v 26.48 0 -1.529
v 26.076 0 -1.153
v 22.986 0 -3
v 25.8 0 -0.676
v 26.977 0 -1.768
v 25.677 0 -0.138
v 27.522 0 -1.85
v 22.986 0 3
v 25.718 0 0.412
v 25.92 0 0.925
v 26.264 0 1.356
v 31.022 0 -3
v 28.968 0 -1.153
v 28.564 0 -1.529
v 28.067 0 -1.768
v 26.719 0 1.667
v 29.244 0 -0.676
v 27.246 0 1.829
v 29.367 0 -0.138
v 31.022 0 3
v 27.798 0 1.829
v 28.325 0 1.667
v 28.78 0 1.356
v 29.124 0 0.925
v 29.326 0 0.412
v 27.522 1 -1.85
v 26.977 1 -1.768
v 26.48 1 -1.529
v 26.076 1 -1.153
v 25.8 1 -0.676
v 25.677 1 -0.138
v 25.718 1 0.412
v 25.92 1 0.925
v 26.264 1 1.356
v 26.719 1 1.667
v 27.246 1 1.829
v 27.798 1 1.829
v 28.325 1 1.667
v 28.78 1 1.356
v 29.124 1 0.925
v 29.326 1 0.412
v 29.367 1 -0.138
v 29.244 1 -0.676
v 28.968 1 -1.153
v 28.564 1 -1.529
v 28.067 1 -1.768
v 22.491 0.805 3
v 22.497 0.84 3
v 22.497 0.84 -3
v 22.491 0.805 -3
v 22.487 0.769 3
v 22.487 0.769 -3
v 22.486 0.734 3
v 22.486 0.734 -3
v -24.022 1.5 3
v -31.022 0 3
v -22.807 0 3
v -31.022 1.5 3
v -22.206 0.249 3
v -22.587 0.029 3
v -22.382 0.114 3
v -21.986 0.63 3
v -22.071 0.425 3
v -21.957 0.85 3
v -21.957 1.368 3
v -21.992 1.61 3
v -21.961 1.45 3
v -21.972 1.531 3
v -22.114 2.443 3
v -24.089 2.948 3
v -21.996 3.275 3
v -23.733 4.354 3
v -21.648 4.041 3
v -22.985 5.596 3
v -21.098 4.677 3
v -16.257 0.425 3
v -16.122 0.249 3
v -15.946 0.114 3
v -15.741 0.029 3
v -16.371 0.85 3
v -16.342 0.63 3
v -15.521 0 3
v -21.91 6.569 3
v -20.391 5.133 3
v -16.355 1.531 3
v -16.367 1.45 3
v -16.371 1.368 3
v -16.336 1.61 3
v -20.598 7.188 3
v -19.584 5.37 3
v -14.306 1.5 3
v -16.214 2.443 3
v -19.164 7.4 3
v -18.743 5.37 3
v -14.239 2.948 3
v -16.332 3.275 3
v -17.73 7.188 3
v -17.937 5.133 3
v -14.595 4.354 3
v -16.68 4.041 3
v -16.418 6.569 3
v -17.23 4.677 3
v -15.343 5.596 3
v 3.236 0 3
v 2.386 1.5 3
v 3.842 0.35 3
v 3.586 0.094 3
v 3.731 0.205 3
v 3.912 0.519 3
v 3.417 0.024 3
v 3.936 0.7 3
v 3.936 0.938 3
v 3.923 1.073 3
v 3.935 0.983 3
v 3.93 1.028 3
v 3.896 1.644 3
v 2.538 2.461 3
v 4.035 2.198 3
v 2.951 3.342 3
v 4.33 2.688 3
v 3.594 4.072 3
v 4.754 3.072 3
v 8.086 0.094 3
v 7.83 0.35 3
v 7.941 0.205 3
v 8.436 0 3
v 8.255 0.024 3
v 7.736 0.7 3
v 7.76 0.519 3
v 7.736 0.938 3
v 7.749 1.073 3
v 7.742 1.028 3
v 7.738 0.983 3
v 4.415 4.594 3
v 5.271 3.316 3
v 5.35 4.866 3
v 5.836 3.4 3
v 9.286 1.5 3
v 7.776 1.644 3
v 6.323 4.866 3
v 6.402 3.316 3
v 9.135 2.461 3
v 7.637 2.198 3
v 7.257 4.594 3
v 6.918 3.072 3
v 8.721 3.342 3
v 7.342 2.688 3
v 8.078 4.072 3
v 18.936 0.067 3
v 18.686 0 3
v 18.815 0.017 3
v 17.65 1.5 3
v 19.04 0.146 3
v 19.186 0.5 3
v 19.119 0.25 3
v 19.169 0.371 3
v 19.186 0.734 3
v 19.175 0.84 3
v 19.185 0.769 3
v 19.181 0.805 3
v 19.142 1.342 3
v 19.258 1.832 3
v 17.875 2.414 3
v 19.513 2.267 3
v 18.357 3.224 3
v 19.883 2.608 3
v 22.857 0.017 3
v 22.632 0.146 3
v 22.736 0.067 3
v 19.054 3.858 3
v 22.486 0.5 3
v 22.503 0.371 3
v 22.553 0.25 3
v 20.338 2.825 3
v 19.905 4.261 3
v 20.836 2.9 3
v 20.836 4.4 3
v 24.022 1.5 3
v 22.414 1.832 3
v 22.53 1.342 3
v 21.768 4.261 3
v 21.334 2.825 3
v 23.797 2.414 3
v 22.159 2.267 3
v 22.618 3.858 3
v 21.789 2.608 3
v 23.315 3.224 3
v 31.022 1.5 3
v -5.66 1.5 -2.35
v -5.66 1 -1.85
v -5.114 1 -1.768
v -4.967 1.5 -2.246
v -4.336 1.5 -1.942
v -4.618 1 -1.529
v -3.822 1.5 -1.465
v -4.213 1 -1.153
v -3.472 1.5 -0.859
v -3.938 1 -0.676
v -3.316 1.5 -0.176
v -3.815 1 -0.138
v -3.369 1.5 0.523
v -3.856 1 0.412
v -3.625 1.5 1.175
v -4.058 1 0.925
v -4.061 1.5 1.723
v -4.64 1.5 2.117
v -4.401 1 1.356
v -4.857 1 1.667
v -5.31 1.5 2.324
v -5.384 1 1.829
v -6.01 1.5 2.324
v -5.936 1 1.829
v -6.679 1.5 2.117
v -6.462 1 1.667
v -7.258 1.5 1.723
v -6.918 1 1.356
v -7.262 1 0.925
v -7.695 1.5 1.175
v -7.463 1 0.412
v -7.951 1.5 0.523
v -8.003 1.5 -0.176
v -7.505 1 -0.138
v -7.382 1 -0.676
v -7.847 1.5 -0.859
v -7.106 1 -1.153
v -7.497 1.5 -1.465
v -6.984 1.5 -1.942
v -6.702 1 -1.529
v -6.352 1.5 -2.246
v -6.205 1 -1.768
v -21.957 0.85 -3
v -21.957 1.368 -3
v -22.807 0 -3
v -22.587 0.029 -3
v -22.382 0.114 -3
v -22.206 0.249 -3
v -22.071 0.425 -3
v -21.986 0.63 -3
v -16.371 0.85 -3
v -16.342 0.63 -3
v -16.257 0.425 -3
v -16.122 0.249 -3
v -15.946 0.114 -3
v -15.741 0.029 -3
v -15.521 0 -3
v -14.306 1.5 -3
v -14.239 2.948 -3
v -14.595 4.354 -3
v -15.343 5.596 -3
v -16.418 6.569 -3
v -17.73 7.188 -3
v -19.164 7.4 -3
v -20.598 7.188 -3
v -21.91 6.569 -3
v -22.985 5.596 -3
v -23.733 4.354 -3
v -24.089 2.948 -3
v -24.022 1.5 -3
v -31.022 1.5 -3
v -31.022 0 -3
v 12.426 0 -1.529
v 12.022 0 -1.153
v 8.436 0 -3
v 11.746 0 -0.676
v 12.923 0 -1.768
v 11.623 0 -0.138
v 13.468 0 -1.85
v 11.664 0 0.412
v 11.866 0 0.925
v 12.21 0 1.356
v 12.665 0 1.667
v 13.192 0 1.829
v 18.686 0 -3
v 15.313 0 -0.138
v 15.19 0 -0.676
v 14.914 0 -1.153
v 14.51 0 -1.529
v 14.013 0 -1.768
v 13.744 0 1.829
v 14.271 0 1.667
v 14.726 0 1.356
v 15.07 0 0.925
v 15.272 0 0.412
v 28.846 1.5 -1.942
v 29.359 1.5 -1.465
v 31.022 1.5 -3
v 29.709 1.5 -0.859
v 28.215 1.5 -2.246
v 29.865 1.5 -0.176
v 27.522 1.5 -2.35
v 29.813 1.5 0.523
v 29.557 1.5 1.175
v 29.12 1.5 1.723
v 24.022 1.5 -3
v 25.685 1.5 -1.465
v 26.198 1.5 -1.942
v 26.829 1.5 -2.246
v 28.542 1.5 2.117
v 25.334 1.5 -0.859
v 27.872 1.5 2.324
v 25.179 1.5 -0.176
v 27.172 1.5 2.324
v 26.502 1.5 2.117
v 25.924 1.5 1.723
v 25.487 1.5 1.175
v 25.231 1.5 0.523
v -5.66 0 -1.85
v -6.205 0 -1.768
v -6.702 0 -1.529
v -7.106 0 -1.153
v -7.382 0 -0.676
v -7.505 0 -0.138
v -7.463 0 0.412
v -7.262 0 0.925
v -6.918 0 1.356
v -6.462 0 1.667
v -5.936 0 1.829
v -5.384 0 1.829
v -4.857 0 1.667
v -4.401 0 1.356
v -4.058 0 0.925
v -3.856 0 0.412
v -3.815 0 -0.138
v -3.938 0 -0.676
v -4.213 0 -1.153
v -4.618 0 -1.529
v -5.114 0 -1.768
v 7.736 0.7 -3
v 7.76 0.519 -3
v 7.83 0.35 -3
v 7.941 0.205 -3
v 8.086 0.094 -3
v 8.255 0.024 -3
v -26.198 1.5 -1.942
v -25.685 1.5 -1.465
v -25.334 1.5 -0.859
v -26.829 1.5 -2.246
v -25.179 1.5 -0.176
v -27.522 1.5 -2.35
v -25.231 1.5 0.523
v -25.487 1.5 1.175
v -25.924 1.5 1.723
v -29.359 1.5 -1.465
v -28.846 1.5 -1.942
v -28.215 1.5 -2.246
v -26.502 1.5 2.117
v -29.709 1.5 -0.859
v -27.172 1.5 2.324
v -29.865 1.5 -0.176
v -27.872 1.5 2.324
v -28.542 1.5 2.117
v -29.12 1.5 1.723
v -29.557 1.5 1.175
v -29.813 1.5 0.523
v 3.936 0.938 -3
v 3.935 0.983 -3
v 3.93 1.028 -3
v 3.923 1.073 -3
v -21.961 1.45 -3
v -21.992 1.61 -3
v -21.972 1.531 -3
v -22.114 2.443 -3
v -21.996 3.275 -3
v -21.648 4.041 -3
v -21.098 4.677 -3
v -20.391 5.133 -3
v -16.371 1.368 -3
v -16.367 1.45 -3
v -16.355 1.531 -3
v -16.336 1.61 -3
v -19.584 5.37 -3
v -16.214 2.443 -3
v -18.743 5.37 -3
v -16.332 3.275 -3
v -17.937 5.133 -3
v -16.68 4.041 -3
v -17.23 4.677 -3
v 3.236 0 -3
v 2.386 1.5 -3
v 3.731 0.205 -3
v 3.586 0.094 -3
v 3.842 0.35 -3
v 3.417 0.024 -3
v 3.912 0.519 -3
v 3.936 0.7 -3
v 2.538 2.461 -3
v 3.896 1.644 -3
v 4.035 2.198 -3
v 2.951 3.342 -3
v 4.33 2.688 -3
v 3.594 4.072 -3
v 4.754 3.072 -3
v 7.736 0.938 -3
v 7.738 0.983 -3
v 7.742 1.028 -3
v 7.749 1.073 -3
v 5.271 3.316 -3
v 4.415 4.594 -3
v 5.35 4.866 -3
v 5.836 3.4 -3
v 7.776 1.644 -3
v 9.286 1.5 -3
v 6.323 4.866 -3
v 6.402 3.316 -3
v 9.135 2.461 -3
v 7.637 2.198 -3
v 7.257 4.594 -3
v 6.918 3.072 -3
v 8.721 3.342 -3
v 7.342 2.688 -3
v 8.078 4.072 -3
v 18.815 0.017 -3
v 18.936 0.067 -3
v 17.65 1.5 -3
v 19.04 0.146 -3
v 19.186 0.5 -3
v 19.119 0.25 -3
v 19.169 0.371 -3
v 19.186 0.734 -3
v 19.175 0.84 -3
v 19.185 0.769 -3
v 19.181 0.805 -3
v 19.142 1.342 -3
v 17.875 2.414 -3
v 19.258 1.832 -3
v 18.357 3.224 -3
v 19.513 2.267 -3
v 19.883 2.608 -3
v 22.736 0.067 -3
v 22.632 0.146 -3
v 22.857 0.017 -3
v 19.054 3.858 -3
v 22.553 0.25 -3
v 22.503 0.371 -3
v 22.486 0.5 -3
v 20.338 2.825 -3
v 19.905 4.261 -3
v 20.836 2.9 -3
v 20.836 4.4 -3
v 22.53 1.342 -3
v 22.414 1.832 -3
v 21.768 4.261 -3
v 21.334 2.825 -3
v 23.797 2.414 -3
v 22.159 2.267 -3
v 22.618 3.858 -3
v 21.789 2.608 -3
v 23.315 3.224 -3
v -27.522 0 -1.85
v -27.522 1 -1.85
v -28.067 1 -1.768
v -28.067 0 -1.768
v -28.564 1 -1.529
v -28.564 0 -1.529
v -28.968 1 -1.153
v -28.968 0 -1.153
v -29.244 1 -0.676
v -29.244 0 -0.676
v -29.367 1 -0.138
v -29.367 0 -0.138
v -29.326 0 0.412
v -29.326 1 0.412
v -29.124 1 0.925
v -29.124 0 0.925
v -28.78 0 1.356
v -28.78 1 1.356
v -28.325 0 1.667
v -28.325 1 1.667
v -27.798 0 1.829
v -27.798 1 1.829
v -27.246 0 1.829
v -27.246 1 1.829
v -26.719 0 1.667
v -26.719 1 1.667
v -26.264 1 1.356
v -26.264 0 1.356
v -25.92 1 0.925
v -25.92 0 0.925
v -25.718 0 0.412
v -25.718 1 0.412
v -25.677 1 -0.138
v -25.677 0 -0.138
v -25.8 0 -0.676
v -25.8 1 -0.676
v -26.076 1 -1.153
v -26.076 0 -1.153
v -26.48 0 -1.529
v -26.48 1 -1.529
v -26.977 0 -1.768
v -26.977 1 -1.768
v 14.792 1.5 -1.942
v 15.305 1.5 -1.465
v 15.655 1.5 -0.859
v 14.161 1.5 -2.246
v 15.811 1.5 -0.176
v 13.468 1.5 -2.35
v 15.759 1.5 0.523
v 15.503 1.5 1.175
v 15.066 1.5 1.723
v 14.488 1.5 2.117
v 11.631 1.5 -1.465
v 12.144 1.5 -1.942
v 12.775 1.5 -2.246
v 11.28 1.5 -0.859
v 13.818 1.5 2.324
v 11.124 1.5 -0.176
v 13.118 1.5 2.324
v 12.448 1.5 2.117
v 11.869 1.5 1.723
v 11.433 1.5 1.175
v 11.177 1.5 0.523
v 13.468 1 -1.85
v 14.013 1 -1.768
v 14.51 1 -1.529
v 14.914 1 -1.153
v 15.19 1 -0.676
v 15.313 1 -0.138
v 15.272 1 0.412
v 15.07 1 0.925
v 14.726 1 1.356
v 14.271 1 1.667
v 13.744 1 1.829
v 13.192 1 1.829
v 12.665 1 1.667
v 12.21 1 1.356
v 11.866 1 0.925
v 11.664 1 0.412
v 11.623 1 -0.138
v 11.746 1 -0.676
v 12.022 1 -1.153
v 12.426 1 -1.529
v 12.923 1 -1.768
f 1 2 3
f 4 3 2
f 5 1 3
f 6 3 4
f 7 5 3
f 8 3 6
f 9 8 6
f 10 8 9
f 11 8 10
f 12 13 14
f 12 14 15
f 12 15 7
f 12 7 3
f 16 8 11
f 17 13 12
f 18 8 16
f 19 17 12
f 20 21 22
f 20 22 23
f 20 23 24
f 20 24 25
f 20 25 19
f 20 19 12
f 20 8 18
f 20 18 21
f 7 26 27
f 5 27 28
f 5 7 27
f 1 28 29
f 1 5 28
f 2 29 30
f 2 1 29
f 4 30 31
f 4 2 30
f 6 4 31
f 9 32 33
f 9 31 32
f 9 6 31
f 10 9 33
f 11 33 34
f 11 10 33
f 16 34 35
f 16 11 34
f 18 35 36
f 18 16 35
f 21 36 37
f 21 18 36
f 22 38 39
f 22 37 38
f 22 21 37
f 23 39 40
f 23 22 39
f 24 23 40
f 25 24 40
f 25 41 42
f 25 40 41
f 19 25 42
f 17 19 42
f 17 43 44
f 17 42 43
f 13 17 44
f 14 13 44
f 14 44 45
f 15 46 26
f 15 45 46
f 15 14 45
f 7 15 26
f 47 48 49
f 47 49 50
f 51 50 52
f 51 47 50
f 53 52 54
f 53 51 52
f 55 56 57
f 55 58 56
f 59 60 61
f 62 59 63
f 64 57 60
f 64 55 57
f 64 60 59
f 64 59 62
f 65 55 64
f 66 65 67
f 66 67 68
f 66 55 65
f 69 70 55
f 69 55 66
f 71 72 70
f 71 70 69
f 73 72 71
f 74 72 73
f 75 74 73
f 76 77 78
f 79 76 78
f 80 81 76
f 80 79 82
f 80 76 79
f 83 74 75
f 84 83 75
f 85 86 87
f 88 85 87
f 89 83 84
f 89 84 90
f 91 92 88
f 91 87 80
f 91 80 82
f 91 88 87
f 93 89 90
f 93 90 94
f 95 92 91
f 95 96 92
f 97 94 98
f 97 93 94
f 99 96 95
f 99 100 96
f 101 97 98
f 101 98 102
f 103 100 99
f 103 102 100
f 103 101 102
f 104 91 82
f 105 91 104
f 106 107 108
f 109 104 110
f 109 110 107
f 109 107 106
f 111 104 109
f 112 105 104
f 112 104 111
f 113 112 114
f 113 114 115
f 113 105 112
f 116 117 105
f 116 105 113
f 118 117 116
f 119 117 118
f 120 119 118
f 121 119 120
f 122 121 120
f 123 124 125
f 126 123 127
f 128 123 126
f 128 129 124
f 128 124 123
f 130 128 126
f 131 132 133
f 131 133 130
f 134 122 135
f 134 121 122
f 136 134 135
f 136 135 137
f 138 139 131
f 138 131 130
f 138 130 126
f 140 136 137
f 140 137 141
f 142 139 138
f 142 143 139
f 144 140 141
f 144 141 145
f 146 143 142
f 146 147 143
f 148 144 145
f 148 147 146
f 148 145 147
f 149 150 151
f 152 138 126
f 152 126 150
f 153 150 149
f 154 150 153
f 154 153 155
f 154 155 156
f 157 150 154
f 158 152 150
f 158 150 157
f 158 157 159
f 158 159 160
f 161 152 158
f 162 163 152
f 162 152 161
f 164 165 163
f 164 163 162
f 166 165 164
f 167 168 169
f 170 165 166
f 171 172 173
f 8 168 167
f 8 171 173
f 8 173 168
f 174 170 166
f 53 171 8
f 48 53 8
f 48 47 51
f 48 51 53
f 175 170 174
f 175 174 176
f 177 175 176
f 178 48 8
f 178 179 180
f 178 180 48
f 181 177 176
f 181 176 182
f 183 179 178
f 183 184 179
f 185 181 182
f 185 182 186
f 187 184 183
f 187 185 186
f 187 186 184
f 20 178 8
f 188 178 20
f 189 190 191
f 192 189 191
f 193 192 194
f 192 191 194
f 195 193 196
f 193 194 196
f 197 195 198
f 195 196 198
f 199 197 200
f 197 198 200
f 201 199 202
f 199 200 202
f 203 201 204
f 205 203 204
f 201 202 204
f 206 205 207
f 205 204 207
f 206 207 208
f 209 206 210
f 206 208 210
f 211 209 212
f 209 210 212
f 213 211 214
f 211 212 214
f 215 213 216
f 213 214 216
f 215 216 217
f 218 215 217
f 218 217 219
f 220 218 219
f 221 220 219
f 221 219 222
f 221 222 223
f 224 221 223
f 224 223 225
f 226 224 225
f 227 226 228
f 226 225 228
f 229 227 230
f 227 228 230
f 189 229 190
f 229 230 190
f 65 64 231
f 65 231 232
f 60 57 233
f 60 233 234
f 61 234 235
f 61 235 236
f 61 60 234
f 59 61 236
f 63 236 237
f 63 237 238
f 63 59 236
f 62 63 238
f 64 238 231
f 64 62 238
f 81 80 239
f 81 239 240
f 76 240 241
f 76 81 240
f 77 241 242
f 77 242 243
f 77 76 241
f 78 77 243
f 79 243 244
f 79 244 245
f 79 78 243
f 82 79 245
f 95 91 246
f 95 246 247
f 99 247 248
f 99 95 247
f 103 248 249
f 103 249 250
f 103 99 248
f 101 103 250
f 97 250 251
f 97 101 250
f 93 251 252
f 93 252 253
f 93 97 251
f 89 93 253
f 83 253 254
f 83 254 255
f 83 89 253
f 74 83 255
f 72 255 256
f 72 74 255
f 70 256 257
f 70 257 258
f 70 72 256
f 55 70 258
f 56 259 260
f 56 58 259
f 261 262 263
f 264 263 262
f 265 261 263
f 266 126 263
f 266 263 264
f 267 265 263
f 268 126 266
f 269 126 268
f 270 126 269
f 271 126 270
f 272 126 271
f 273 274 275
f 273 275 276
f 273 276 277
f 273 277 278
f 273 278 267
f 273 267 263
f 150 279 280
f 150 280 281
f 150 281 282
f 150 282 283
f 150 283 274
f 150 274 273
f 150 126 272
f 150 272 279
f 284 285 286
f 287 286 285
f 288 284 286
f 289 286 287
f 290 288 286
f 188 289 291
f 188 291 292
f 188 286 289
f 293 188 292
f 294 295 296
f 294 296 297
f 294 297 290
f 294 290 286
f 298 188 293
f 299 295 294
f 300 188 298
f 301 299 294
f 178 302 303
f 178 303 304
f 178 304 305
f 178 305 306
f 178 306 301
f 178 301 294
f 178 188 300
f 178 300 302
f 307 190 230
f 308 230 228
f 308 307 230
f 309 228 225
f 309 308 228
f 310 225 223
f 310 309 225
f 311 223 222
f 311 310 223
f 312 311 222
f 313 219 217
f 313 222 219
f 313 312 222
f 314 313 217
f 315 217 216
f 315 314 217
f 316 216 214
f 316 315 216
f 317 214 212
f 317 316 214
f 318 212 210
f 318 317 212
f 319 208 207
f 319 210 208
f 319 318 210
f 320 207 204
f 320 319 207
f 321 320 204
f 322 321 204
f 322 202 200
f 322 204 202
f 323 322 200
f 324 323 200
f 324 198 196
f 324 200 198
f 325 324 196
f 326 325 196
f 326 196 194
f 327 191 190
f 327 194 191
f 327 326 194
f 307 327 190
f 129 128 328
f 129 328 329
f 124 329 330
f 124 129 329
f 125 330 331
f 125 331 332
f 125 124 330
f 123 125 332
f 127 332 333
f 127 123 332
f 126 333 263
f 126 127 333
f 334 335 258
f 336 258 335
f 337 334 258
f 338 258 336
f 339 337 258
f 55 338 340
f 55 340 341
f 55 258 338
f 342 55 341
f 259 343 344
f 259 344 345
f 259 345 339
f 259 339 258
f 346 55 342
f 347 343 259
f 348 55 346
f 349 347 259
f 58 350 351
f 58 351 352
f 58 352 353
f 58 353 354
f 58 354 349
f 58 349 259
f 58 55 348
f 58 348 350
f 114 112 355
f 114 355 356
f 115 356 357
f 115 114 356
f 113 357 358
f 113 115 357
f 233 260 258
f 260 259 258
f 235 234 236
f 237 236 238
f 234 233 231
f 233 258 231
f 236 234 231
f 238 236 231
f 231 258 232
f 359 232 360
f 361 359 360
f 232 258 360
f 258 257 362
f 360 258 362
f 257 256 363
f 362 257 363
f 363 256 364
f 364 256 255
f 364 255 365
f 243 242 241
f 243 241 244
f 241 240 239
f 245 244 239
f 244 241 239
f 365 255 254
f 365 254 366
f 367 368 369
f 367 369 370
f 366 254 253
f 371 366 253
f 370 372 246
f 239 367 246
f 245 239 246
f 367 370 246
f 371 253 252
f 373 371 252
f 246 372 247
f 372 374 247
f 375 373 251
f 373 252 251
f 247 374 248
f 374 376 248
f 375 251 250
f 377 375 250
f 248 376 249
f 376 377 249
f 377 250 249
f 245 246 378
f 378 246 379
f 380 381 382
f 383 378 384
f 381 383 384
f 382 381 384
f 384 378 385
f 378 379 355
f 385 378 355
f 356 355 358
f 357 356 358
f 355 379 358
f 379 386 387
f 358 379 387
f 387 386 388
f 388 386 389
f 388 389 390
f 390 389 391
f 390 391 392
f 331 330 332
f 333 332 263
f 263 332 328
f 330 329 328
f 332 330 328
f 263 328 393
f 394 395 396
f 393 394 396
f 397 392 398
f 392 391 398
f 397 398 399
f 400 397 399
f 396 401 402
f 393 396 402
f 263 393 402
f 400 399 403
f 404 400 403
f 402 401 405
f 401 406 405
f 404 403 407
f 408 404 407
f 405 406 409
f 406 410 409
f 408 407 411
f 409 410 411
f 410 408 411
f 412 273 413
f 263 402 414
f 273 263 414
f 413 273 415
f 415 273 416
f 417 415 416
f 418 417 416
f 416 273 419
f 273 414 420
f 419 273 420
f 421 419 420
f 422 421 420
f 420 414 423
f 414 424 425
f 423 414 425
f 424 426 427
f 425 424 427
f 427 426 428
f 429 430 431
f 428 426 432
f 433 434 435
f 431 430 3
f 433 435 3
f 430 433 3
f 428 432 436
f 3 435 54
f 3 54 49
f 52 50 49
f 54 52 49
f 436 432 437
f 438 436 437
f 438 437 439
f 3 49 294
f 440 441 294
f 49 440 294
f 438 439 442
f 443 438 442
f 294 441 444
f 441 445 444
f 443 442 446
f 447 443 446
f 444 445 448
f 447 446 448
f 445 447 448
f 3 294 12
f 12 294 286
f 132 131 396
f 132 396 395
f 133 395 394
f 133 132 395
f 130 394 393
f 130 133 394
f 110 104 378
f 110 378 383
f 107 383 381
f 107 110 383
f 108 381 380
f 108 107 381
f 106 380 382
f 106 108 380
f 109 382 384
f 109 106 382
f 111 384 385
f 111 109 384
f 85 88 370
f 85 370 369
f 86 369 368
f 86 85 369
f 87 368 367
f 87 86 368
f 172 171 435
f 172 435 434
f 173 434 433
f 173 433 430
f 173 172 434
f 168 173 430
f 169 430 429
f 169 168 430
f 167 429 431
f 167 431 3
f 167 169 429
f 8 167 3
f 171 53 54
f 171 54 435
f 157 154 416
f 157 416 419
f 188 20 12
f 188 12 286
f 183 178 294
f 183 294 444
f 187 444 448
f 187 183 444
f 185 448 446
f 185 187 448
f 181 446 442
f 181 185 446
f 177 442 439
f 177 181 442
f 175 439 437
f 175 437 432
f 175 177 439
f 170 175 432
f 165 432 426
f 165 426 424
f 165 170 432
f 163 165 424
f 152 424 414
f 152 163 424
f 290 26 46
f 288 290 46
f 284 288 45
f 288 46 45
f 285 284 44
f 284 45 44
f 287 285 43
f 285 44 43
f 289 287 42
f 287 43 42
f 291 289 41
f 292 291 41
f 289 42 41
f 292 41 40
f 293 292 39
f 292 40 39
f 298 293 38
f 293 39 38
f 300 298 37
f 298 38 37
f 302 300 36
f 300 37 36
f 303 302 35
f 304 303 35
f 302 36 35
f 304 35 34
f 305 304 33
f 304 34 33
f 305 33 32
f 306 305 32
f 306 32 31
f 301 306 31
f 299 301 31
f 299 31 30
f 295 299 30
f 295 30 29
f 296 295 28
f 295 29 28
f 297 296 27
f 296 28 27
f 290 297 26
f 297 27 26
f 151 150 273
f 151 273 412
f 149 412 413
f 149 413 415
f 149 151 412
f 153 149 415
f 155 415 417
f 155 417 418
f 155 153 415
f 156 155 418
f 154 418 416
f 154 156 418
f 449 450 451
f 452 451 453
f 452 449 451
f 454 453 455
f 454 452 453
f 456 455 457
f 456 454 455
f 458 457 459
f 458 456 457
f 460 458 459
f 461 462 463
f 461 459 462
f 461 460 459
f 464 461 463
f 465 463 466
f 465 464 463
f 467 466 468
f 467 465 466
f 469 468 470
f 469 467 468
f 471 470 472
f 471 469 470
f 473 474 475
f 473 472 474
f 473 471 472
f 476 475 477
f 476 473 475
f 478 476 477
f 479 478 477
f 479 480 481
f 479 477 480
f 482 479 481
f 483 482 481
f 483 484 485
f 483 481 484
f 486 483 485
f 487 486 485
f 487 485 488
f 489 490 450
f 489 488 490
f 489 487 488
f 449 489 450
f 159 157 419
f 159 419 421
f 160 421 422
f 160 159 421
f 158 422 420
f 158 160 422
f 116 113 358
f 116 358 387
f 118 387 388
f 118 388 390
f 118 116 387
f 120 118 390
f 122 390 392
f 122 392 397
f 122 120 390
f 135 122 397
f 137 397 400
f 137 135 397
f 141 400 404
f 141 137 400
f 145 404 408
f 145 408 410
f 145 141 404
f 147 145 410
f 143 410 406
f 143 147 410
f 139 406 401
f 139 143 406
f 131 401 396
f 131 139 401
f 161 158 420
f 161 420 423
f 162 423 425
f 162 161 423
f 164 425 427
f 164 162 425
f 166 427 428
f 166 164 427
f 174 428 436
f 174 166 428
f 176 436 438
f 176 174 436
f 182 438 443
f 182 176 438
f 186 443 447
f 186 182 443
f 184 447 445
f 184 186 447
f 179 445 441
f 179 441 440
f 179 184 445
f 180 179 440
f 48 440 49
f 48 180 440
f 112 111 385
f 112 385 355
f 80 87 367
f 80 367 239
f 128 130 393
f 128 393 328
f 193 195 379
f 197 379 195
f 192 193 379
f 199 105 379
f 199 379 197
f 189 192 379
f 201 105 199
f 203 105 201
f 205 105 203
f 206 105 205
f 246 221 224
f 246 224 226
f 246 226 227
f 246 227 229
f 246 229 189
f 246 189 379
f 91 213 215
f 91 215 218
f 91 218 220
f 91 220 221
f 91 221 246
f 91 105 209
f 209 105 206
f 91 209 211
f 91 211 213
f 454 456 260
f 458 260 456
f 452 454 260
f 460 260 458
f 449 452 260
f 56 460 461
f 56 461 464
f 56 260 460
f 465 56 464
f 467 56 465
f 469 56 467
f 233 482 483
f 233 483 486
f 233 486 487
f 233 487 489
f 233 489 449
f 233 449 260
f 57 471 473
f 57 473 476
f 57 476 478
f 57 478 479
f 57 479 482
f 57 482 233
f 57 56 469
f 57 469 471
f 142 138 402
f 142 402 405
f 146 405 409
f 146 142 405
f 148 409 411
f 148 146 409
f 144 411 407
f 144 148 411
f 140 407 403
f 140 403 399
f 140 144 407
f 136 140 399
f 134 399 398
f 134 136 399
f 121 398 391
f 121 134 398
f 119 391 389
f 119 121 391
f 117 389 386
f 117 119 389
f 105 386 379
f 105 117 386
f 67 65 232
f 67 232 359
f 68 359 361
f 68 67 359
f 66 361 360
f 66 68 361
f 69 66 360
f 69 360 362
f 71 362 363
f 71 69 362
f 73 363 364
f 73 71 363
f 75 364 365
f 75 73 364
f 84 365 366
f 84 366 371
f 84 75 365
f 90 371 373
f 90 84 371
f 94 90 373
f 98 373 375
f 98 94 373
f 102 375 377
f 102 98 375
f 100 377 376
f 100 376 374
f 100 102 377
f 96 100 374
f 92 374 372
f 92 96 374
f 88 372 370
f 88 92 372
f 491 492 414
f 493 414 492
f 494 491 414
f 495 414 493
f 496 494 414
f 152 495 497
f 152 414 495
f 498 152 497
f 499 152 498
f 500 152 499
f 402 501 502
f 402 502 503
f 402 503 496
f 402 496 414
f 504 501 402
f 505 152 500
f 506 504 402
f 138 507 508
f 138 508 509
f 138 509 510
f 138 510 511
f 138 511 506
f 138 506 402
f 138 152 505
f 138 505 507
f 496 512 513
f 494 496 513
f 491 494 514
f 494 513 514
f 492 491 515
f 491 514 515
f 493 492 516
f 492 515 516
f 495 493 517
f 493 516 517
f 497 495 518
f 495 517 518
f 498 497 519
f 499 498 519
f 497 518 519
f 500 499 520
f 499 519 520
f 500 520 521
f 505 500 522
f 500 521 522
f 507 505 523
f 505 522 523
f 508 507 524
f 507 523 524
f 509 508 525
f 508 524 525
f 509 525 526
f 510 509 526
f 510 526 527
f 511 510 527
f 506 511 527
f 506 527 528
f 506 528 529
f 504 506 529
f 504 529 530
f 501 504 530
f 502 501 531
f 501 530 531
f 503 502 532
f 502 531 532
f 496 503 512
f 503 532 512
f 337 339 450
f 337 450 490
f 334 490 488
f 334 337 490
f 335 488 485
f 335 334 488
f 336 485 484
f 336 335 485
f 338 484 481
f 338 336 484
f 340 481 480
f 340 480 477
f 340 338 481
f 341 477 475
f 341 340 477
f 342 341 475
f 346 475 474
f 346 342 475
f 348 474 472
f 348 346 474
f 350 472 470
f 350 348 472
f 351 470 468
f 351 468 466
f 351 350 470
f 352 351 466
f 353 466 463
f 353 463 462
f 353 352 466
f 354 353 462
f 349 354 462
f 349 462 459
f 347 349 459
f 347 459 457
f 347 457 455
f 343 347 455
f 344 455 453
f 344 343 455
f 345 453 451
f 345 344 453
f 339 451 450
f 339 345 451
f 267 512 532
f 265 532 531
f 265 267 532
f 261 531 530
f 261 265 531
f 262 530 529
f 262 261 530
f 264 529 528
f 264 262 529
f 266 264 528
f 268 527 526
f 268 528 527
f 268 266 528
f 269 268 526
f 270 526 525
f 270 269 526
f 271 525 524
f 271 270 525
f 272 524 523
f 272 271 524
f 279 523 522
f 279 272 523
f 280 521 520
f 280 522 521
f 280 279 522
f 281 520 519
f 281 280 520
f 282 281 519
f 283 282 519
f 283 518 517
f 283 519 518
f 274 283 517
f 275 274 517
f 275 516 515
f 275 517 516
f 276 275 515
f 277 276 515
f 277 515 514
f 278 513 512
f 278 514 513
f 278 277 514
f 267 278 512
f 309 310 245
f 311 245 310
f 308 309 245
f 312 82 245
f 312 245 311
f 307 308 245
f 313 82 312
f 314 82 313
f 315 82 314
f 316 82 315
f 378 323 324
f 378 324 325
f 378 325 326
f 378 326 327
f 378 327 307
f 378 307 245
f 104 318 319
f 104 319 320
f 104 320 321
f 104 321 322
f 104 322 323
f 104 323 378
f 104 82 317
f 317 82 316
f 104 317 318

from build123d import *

# Parameters (mm, degrees)
BOSS_EXTRUDE1_DEPTH = 3
CUT_EXTRUDE2_REACH  = 34.033
SKETCH2_R           = 1.85
CHAMFER2_SIZE       = 0.5


with BuildPart() as part:
    # Sketch1 → Boss-Extrude1 (new, symmetric)
    with BuildSketch(Plane.XY):
        with BuildLine():
            Line((-31.021944793, 0), (-22.806809681, 0))
            ThreePointArc((-22.806809681, 0), (-22.205768917, 0.248959236), (-21.956809681, 0.85))
            Line((-21.956809681, 0.85), (-21.956809681, 1.36849254))
            ThreePointArc((-21.956809681, 1.36849254), (-21.965643691, 1.490720925), (-21.9919621, 1.610408683))
            ThreePointArc((-21.9919621, 1.610408683), (-19.163961672, 5.4), (-16.335961244, 1.610408683))
            ThreePointArc((-16.335961244, 1.610408683), (-16.362279653, 1.490720925), (-16.371113663, 1.36849254))
            Line((-16.371113663, 1.36849254), (-16.371113663, 0.85))
            ThreePointArc((-16.371113663, 0.85), (-16.122154427, 0.248959236), (-15.521113663, 0))
            Line((-15.521113663, 0), (3.236038328, 0))
            ThreePointArc((3.236038328, 0), (3.731013075, 0.205025253), (3.936038328, 0.7))
            Line((3.936038328, 0.7), (3.936038328, 0.937652462))
            ThreePointArc((3.936038328, 0.937652462), (3.932728617, 1.005642472), (3.922830781, 1.072989547))
            ThreePointArc((3.922830781, 1.072989547), (5.836038328, 3.4), (7.749245875, 1.072989547))
            ThreePointArc((7.749245875, 1.072989547), (7.739348039, 1.005642472), (7.736038328, 0.937652462))
            Line((7.736038328, 0.937652462), (7.736038328, 0.7))
            ThreePointArc((7.736038328, 0.7), (7.941063581, 0.205025253), (8.436038328, 0))
            Line((8.436038328, 0), (18.686038328, 0))
            ThreePointArc((18.686038328, 0), (19.039591719, 0.146446609), (19.186038328, 0.5))
            Line((19.186038328, 0.5), (19.186038328, 0.733631047))
            ThreePointArc((19.186038328, 0.733631047), (19.183189302, 0.786931226), (19.174674692, 0.839623991))
            ThreePointArc((19.174674692, 0.839623991), (20.836038328, 2.9), (22.497401964, 0.839623991))
            ThreePointArc((22.497401964, 0.839623991), (22.488887354, 0.786931226), (22.486038328, 0.733631047))
            Line((22.486038328, 0.733631047), (22.486038328, 0.5))
            ThreePointArc((22.486038328, 0.5), (22.632484937, 0.146446609), (22.986038328, 0))
            Line((22.986038328, 0), (31.021944793, 0))
            Line((31.021944793, 0), (31.021944793, 1.5))
            Line((31.021944793, 1.5), (24.021944793, 1.5))
            ThreePointArc((24.021944793, 1.5), (20.836038328, 4.4), (17.650131864, 1.5))
            Line((17.650131864, 1.5), (9.28567599, 1.5))
            ThreePointArc((9.28567599, 1.5), (5.836038328, 4.9), (2.386400666, 1.5))
            Line((2.386400666, 1.5), (-14.305978551, 1.5))
            ThreePointArc((-14.305978551, 1.5), (-19.163961672, 7.4), (-24.021944793, 1.5))
            Line((-24.021944793, 1.5), (-31.021944793, 1.5))
            Line((-31.021944793, 1.5), (-31.021944793, 0))
        make_face()
    extrude(amount=BOSS_EXTRUDE1_DEPTH, both=True)

    # Sketch2 → Cut-Extrude2 (cut, up to next)
    with BuildSketch(Plane(origin=(0, 0, 0), x_dir=(1, 0, 0), z_dir=(0, 1, 0)), mode=Mode.PRIVATE) as cut_extrude2_sk1:
        with Locations((-27.521944793, 0)):
            Circle(SKETCH2_R)
    cut_extrude2_tool1 = extrude(cut_extrude2_sk1.sketch, amount=CUT_EXTRUDE2_REACH, mode=Mode.PRIVATE) & part.part
    # Sketch2 → Cut-Extrude2 (cut, up to next)
    with BuildSketch(Plane(origin=(0, 0, 0), x_dir=(1, 0, 0), z_dir=(0, 1, 0)), mode=Mode.PRIVATE) as cut_extrude2_sk2:
        with Locations((-5.659788943, 0)):
            Circle(SKETCH2_R)
    cut_extrude2_tool2 = extrude(cut_extrude2_sk2.sketch, amount=CUT_EXTRUDE2_REACH, mode=Mode.PRIVATE) & part.part
    # Sketch2 → Cut-Extrude2 (cut, up to next)
    with BuildSketch(Plane(origin=(0, 0, 0), x_dir=(1, 0, 0), z_dir=(0, 1, 0)), mode=Mode.PRIVATE) as cut_extrude2_sk3:
        with Locations((27.521944793, 0)):
            Circle(SKETCH2_R)
    cut_extrude2_tool3 = extrude(cut_extrude2_sk3.sketch, amount=CUT_EXTRUDE2_REACH, mode=Mode.PRIVATE) & part.part
    # Sketch2 → Cut-Extrude2 (cut, up to next)
    with BuildSketch(Plane(origin=(0, 0, 0), x_dir=(1, 0, 0), z_dir=(0, 1, 0)), mode=Mode.PRIVATE) as cut_extrude2_sk4:
        with Locations((13.467903927, 0)):
            Circle(SKETCH2_R)
    cut_extrude2_tool4 = extrude(cut_extrude2_sk4.sketch, amount=CUT_EXTRUDE2_REACH, mode=Mode.PRIVATE) & part.part
    add(cut_extrude2_tool1.solids().sort_by_distance((-27.521945, 0, 0))[0], mode=Mode.SUBTRACT)
    add(cut_extrude2_tool2.solids().sort_by_distance((-5.659789, 0, 0))[0], mode=Mode.SUBTRACT)
    add(cut_extrude2_tool3.solids().sort_by_distance((27.521945, 0, 0))[0], mode=Mode.SUBTRACT)
    add(cut_extrude2_tool4.solids().sort_by_distance((13.467904, 0, 0))[0], mode=Mode.SUBTRACT)

    # Chamfer2
    chamfer2_edges = [part.edges().sort_by_distance(p)[0] for p in [
        (25.671944793, 1.5, 0),
        (11.617903927, 1.5, 0),
        (-7.509788943, 1.5, 0),
        (-29.371944793, 1.5, 0),
    ]]
    chamfer(chamfer2_edges, length=CHAMFER2_SIZE)


solid = part.part
